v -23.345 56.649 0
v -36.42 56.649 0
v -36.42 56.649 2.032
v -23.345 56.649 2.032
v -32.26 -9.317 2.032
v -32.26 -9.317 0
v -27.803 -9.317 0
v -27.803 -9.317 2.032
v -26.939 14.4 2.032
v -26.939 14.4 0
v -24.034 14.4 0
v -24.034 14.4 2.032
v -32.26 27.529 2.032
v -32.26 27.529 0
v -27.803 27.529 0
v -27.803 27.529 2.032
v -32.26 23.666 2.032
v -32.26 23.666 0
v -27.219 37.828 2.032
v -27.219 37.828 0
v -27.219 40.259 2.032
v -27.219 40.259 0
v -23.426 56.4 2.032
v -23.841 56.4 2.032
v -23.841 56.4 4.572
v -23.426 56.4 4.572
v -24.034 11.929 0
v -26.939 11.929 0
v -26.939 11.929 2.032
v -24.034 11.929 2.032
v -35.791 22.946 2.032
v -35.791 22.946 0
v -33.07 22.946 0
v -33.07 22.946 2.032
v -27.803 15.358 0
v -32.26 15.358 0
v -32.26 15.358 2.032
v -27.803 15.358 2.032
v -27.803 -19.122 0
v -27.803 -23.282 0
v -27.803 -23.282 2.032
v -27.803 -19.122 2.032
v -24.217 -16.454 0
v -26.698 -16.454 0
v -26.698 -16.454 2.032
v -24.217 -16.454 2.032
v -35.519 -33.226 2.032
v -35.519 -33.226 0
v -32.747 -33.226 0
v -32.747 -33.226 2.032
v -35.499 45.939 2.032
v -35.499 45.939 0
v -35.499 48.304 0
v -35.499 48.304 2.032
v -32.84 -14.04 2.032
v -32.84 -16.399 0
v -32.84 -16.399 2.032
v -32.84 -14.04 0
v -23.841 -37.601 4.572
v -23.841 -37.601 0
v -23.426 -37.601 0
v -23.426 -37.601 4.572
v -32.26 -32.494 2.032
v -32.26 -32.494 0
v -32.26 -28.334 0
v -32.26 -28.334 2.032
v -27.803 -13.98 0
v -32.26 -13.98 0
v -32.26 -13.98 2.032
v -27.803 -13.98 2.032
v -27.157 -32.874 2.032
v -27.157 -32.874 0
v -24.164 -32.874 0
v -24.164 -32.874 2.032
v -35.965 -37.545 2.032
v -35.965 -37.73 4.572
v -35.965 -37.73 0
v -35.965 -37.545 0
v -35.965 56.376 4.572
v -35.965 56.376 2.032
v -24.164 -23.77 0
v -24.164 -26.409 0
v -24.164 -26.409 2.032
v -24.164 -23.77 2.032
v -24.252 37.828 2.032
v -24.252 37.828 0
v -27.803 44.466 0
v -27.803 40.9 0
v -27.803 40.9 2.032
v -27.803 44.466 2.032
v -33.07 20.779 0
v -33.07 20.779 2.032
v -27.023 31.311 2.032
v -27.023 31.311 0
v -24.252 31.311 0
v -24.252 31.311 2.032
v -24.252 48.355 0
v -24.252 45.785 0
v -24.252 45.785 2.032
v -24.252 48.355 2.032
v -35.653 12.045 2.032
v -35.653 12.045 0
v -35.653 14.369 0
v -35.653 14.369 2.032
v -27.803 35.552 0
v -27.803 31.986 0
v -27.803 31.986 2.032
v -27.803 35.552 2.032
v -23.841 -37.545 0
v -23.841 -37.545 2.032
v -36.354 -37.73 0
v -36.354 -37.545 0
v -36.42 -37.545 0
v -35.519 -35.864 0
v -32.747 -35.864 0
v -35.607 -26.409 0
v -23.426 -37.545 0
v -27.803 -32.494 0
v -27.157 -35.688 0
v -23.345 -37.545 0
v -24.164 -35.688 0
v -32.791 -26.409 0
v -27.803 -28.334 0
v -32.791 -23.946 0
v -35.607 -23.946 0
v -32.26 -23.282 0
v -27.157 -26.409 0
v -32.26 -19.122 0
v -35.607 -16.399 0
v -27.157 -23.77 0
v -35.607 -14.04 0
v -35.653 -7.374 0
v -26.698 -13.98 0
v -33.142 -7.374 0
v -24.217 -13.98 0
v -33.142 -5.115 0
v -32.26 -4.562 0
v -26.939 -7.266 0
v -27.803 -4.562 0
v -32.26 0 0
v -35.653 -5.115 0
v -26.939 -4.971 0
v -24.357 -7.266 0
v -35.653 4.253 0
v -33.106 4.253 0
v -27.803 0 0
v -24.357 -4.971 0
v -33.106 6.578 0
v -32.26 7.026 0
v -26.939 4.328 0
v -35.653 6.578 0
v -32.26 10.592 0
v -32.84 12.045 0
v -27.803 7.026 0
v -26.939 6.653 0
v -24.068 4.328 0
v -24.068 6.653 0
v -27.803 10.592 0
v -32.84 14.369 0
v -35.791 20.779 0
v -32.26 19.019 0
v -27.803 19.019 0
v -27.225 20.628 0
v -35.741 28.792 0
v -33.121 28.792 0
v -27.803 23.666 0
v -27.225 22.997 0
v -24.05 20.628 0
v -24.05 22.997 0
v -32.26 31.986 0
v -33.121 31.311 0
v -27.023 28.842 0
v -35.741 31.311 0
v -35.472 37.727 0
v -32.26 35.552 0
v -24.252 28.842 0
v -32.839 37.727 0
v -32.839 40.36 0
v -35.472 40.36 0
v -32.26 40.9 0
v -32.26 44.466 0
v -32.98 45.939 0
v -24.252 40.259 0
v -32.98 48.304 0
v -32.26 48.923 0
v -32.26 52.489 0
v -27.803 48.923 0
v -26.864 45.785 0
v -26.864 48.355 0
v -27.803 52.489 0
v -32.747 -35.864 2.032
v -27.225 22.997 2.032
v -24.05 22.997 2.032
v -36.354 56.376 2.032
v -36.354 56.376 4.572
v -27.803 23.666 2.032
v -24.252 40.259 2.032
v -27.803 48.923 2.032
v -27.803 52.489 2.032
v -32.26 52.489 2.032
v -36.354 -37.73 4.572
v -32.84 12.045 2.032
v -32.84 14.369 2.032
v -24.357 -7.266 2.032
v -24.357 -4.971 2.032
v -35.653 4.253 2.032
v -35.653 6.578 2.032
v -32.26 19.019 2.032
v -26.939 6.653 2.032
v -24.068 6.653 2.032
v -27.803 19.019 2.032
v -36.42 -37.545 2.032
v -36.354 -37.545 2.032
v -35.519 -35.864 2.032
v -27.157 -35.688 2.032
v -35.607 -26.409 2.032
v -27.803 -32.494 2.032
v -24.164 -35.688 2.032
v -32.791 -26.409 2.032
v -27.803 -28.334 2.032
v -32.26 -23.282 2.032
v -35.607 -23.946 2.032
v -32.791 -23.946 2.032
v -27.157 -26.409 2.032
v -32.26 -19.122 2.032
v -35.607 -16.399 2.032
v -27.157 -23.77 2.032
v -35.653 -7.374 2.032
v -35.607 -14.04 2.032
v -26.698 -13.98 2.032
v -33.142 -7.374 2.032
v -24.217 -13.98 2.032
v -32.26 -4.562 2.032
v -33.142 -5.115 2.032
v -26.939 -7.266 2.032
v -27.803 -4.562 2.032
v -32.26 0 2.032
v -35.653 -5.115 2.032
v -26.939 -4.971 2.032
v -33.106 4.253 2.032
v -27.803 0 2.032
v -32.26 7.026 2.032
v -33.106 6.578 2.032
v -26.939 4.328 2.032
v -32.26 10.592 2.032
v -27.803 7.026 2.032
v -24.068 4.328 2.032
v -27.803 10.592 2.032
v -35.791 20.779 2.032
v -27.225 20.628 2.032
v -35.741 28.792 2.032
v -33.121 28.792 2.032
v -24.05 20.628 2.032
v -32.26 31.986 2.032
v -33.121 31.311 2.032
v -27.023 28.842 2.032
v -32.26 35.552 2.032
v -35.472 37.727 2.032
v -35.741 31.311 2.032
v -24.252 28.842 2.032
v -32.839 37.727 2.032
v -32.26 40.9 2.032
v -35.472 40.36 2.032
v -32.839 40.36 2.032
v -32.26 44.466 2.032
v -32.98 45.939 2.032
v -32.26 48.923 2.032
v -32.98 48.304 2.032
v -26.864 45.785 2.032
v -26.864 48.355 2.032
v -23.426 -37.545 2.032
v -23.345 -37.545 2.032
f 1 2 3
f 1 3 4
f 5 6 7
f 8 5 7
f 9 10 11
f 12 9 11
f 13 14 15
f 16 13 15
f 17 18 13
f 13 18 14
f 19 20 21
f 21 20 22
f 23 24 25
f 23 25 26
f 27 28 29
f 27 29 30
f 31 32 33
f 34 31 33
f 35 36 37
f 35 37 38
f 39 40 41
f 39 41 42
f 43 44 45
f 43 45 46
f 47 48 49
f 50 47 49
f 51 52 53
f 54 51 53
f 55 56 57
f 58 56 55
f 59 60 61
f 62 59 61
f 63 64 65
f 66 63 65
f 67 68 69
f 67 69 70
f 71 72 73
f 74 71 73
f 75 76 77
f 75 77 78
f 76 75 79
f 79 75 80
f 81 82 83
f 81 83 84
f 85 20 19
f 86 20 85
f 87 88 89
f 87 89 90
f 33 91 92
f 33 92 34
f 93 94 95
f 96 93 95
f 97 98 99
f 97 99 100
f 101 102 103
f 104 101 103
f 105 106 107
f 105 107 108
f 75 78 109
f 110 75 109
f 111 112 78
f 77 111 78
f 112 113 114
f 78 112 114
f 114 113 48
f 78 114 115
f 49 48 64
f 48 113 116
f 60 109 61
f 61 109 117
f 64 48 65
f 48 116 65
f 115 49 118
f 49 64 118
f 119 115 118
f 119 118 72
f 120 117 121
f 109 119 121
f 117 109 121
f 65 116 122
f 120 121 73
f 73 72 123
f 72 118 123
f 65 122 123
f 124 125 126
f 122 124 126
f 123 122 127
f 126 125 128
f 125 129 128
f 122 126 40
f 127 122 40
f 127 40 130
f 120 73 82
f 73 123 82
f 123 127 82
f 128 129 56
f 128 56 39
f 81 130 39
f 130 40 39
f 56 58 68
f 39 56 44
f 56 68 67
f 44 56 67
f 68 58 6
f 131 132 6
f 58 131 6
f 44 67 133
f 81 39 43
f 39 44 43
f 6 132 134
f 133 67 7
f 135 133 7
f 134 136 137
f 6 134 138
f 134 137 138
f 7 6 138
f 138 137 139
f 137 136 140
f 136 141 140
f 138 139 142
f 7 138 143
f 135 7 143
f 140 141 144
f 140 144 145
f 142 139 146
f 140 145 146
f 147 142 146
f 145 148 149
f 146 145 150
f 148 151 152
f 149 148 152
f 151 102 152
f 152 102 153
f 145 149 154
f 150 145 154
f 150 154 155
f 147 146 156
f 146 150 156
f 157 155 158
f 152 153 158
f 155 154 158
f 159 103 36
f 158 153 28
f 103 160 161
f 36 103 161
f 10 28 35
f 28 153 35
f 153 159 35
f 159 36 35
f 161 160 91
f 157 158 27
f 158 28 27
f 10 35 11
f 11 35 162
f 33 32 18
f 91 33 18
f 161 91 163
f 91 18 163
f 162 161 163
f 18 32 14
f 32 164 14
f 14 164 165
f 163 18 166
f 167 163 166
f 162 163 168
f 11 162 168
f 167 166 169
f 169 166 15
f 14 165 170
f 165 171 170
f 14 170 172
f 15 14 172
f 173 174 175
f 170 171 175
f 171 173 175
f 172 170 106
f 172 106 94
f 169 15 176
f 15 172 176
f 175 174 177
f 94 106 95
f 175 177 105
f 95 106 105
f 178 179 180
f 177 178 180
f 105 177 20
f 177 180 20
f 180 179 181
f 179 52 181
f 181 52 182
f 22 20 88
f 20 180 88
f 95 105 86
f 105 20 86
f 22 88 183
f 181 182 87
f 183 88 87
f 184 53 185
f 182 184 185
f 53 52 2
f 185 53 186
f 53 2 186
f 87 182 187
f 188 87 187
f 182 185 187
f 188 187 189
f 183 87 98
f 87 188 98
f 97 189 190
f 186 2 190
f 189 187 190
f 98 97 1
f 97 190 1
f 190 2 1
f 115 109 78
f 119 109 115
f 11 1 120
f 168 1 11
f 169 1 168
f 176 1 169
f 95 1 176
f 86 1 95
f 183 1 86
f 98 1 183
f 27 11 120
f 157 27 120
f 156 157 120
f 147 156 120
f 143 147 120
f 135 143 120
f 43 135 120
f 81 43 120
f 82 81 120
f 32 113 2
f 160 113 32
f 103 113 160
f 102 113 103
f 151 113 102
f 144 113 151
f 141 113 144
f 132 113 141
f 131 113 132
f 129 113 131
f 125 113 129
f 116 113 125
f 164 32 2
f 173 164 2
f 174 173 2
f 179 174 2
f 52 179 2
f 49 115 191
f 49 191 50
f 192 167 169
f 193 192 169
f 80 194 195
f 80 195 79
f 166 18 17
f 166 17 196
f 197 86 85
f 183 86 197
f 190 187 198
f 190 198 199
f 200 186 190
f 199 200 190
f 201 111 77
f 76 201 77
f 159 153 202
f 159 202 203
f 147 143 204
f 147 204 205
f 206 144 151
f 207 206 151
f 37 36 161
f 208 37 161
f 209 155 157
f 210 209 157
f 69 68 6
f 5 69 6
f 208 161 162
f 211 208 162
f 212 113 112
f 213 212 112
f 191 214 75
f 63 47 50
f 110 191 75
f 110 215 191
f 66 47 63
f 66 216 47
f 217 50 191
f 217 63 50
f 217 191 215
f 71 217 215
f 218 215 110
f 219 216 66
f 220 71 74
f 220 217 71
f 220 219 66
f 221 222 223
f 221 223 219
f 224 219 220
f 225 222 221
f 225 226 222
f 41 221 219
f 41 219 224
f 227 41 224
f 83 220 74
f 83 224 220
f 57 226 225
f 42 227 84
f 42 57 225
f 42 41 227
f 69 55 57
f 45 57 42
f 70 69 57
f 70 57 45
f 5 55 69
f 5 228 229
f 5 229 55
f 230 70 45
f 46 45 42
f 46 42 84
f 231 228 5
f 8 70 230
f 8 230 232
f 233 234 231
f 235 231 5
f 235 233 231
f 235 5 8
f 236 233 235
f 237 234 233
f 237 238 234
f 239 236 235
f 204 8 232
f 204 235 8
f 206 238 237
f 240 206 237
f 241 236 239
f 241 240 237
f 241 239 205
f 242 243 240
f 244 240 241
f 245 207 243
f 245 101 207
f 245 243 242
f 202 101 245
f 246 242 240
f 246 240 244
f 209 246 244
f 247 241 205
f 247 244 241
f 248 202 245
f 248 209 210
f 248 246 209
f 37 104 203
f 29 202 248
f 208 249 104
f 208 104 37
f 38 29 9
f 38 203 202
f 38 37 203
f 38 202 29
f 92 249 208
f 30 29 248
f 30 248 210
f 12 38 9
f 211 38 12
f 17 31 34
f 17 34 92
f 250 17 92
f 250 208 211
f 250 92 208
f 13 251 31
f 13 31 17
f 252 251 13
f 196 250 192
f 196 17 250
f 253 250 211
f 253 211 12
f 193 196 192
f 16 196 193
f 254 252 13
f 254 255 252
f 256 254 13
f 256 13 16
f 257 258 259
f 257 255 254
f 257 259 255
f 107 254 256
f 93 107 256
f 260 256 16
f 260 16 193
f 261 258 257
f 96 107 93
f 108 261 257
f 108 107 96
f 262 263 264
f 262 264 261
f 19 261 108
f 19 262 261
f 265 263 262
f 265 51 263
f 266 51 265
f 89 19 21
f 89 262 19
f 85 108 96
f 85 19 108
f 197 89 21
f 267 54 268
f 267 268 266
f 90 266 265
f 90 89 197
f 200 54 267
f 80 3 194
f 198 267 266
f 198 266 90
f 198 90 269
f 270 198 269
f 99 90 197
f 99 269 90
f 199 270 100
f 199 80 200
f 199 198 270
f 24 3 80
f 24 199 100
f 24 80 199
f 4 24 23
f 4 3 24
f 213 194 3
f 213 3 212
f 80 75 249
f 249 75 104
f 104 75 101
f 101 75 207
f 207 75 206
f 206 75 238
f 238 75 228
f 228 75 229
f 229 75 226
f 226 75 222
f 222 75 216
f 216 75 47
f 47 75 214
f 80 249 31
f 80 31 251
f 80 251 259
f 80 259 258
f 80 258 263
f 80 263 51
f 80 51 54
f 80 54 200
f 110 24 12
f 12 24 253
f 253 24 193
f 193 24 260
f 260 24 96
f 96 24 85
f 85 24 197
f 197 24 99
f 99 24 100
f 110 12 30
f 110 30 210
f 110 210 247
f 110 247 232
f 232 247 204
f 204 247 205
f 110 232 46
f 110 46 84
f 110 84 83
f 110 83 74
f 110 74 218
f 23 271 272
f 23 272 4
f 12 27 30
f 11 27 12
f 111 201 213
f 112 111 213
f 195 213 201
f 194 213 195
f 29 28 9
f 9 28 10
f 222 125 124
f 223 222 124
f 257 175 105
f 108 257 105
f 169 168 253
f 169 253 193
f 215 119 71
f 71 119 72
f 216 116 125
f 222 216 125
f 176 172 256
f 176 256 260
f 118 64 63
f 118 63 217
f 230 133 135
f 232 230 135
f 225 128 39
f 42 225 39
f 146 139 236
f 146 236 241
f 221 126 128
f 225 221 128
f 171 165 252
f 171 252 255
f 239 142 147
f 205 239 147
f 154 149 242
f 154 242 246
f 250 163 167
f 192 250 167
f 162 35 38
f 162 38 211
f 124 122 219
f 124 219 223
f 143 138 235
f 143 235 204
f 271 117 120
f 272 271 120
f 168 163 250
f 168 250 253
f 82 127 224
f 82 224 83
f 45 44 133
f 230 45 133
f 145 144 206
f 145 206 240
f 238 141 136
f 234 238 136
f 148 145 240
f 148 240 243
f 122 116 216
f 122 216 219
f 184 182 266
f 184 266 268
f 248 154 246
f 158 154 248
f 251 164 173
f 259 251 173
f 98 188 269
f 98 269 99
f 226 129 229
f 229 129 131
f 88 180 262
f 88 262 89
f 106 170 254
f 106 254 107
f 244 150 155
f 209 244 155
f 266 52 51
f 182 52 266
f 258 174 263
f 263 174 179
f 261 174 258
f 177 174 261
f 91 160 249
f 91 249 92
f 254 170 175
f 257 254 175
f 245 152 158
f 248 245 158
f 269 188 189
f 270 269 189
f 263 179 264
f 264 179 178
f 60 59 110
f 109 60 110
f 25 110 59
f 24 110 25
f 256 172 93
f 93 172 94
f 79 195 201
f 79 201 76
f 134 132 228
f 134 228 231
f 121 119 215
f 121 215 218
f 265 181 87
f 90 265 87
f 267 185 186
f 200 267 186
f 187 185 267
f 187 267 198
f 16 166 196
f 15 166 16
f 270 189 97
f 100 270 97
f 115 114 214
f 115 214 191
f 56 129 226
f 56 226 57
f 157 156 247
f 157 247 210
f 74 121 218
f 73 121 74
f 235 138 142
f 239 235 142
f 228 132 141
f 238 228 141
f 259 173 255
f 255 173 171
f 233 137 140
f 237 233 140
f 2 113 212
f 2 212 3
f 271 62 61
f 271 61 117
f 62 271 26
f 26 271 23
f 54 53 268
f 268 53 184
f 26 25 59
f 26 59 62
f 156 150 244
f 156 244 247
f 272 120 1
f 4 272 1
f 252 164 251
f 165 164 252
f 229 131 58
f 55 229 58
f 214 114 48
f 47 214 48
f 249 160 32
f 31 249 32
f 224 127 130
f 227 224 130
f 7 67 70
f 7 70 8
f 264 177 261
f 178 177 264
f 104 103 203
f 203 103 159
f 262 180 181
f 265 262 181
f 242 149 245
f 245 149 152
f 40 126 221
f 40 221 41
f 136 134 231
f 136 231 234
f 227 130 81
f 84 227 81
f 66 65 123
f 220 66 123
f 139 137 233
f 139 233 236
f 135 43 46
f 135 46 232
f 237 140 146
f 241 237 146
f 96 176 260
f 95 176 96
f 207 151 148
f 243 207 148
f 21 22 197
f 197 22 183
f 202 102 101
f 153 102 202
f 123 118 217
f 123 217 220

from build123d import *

# Parameters (mm, degrees)
F0_W     = 13.074241
F0_H     = 94.193969
F0_W_2   = 2.772734
F0_H_2   = 2.638768
F0_W_3   = 2.816748
F0_H_3   = 2.462851
F0_W_4   = 2.767764
F0_H_4   = 2.35983
F0_W_5   = 4.457127
F0_H_5   = 4.159985
F0_H_6   = 4.159987
F0_W_6   = 2.510216
F0_H_7   = 2.259195
F0_W_7   = 2.54634
F0_H_8   = 2.325126
F0_H_9   = 4.663303
F0_H_10  = 4.562473
F0_H_11  = 3.565702
F0_W_8   = 2.992794
F0_H_12  = 2.814685
F0_W_9   = 2.481149
F0_H_13  = 2.474324
F0_W_10  = 2.581937
F0_H_14  = 2.295056
F0_W_11  = 2.870289
F0_W_12  = 2.812862
F0_H_15  = 2.324136
F0_W_13  = 2.721176
F0_H_16  = 2.166863
F0_W_14  = 2.620392
F0_H_17  = 2.519607
F0_H_18  = 3.660711
F0_H_19  = 3.862843
F0_W_15  = 2.633039
F0_H_20  = 2.633039
F0_W_16  = 2.51843
F0_H_21  = 2.364244
F0_H_22  = 3.565703
F0_W_17  = 2.904148
F0_H_23  = 2.471199
F0_W_18  = 3.174707
F0_H_24  = 2.368433
F0_W_19  = 2.771571
F0_H_25  = 2.469215
F0_W_20  = 2.967037
F0_H_26  = 2.430499
F0_W_21  = 2.61249
F0_H_27  = 2.569832
F1_DEPTH = 2.032
F2_W     = 0.389233
F2_H     = 94.105582
F2_W_2   = 0.415065
F2_H_2   = 94.00139
F3_DEPTH = 4.572


with BuildPart() as f1:
    # F0 (on Top) → F1 (new body)
    with BuildSketch(Plane.XY):
        with Locations((-29.882617, 9.551766)):
            Rectangle(F0_W, F0_H)
        with Locations((-34.133058, -34.544973)):
            Rectangle(F0_W_2, F0_H_2, mode=Mode.SUBTRACT)
        with Locations((-34.199076, -25.177347)):
            Rectangle(F0_W_3, F0_H_3, mode=Mode.SUBTRACT)
        with Locations((-34.223568, -15.219573)):
            Rectangle(F0_W_4, F0_H_4, mode=Mode.SUBTRACT)
        with Locations((-30.031188, -30.413814)):
            Rectangle(F0_W_5, F0_H_5, mode=Mode.SUBTRACT)
        with Locations((-30.031188, -21.202417)):
            Rectangle(F0_W_5, F0_H_6, mode=Mode.SUBTRACT)
        with Locations((-34.39744, -6.244165)):
            Rectangle(F0_W_6, F0_H_7, mode=Mode.SUBTRACT)
        with Locations((-34.379378, 5.415873)):
            Rectangle(F0_W_7, F0_H_8, mode=Mode.SUBTRACT)
        with Locations((-30.031188, -11.648393)):
            Rectangle(F0_W_5, F0_H_9, mode=Mode.SUBTRACT)
        with Locations((-30.031188, -2.281236)):
            Rectangle(F0_W_5, F0_H_10, mode=Mode.SUBTRACT)
        with Locations((-30.031188, 8.808911)):
            Rectangle(F0_W_5, F0_H_11, mode=Mode.SUBTRACT)
        with Locations((-25.660809, -34.281095)):
            Rectangle(F0_W_8, F0_H_12, mode=Mode.SUBTRACT)
        with Locations((-25.660809, -25.089389)):
            Rectangle(F0_W_8, F0_H_2, mode=Mode.SUBTRACT)
        with Locations((-25.457825, -15.217207)):
            Rectangle(F0_W_9, F0_H_13, mode=Mode.SUBTRACT)
        with Locations((-25.647538, -6.118654)):
            Rectangle(F0_W_10, F0_H_14, mode=Mode.SUBTRACT)
        with Locations((-25.503362, 5.490877)):
            Rectangle(F0_W_11, F0_H_8, mode=Mode.SUBTRACT)
        with Locations((-34.246117, 13.206795)):
            Rectangle(F0_W_12, F0_H_15, mode=Mode.SUBTRACT)
        with Locations((-34.430865, 21.862716)):
            Rectangle(F0_W_13, F0_H_16, mode=Mode.SUBTRACT)
        with Locations((-34.430865, 30.051447)):
            Rectangle(F0_W_14, F0_H_17, mode=Mode.SUBTRACT)
        with Locations((-30.031188, 17.188502)):
            Rectangle(F0_W_5, F0_H_18, mode=Mode.SUBTRACT)
        with Locations((-30.031188, 25.597425)):
            Rectangle(F0_W_5, F0_H_19, mode=Mode.SUBTRACT)
        with Locations((-34.155721, 39.043644)):
            Rectangle(F0_W_15, F0_H_20, mode=Mode.SUBTRACT)
        with Locations((-34.239542, 47.121396)):
            Rectangle(F0_W_16, F0_H_21, mode=Mode.SUBTRACT)
        with Locations((-30.031188, 33.768827)):
            Rectangle(F0_W_5, F0_H_11, mode=Mode.SUBTRACT)
        with Locations((-30.031188, 42.683085)):
            Rectangle(F0_W_5, F0_H_22, mode=Mode.SUBTRACT)
        with Locations((-30.031188, 50.705915)):
            Rectangle(F0_W_5, F0_H_22, mode=Mode.SUBTRACT)
        with Locations((-25.486433, 13.164537)):
            Rectangle(F0_W_17, F0_H_23, mode=Mode.SUBTRACT)
        with Locations((-25.637428, 21.812324)):
            Rectangle(F0_W_18, F0_H_24, mode=Mode.SUBTRACT)
        with Locations((-25.637428, 30.076643)):
            Rectangle(F0_W_19, F0_H_25, mode=Mode.SUBTRACT)
        with Locations((-25.73516, 39.043646)):
            Rectangle(F0_W_20, F0_H_26, mode=Mode.SUBTRACT)
        with Locations((-25.557887, 47.07)):
            Rectangle(F0_W_21, F0_H_27, mode=Mode.SUBTRACT)
    extrude(amount=F1_DEPTH)

    # F2 (on Top) → F3 (join)
    with BuildSketch(Plane.XY):
        with Locations((-36.159336, 9.322742)):
            Rectangle(F2_W, F2_H)
        with Locations((-23.633422, 9.399328)):
            Rectangle(F2_W_2, F2_H_2)
    extrude(amount=F3_DEPTH)


solid = f1.part
